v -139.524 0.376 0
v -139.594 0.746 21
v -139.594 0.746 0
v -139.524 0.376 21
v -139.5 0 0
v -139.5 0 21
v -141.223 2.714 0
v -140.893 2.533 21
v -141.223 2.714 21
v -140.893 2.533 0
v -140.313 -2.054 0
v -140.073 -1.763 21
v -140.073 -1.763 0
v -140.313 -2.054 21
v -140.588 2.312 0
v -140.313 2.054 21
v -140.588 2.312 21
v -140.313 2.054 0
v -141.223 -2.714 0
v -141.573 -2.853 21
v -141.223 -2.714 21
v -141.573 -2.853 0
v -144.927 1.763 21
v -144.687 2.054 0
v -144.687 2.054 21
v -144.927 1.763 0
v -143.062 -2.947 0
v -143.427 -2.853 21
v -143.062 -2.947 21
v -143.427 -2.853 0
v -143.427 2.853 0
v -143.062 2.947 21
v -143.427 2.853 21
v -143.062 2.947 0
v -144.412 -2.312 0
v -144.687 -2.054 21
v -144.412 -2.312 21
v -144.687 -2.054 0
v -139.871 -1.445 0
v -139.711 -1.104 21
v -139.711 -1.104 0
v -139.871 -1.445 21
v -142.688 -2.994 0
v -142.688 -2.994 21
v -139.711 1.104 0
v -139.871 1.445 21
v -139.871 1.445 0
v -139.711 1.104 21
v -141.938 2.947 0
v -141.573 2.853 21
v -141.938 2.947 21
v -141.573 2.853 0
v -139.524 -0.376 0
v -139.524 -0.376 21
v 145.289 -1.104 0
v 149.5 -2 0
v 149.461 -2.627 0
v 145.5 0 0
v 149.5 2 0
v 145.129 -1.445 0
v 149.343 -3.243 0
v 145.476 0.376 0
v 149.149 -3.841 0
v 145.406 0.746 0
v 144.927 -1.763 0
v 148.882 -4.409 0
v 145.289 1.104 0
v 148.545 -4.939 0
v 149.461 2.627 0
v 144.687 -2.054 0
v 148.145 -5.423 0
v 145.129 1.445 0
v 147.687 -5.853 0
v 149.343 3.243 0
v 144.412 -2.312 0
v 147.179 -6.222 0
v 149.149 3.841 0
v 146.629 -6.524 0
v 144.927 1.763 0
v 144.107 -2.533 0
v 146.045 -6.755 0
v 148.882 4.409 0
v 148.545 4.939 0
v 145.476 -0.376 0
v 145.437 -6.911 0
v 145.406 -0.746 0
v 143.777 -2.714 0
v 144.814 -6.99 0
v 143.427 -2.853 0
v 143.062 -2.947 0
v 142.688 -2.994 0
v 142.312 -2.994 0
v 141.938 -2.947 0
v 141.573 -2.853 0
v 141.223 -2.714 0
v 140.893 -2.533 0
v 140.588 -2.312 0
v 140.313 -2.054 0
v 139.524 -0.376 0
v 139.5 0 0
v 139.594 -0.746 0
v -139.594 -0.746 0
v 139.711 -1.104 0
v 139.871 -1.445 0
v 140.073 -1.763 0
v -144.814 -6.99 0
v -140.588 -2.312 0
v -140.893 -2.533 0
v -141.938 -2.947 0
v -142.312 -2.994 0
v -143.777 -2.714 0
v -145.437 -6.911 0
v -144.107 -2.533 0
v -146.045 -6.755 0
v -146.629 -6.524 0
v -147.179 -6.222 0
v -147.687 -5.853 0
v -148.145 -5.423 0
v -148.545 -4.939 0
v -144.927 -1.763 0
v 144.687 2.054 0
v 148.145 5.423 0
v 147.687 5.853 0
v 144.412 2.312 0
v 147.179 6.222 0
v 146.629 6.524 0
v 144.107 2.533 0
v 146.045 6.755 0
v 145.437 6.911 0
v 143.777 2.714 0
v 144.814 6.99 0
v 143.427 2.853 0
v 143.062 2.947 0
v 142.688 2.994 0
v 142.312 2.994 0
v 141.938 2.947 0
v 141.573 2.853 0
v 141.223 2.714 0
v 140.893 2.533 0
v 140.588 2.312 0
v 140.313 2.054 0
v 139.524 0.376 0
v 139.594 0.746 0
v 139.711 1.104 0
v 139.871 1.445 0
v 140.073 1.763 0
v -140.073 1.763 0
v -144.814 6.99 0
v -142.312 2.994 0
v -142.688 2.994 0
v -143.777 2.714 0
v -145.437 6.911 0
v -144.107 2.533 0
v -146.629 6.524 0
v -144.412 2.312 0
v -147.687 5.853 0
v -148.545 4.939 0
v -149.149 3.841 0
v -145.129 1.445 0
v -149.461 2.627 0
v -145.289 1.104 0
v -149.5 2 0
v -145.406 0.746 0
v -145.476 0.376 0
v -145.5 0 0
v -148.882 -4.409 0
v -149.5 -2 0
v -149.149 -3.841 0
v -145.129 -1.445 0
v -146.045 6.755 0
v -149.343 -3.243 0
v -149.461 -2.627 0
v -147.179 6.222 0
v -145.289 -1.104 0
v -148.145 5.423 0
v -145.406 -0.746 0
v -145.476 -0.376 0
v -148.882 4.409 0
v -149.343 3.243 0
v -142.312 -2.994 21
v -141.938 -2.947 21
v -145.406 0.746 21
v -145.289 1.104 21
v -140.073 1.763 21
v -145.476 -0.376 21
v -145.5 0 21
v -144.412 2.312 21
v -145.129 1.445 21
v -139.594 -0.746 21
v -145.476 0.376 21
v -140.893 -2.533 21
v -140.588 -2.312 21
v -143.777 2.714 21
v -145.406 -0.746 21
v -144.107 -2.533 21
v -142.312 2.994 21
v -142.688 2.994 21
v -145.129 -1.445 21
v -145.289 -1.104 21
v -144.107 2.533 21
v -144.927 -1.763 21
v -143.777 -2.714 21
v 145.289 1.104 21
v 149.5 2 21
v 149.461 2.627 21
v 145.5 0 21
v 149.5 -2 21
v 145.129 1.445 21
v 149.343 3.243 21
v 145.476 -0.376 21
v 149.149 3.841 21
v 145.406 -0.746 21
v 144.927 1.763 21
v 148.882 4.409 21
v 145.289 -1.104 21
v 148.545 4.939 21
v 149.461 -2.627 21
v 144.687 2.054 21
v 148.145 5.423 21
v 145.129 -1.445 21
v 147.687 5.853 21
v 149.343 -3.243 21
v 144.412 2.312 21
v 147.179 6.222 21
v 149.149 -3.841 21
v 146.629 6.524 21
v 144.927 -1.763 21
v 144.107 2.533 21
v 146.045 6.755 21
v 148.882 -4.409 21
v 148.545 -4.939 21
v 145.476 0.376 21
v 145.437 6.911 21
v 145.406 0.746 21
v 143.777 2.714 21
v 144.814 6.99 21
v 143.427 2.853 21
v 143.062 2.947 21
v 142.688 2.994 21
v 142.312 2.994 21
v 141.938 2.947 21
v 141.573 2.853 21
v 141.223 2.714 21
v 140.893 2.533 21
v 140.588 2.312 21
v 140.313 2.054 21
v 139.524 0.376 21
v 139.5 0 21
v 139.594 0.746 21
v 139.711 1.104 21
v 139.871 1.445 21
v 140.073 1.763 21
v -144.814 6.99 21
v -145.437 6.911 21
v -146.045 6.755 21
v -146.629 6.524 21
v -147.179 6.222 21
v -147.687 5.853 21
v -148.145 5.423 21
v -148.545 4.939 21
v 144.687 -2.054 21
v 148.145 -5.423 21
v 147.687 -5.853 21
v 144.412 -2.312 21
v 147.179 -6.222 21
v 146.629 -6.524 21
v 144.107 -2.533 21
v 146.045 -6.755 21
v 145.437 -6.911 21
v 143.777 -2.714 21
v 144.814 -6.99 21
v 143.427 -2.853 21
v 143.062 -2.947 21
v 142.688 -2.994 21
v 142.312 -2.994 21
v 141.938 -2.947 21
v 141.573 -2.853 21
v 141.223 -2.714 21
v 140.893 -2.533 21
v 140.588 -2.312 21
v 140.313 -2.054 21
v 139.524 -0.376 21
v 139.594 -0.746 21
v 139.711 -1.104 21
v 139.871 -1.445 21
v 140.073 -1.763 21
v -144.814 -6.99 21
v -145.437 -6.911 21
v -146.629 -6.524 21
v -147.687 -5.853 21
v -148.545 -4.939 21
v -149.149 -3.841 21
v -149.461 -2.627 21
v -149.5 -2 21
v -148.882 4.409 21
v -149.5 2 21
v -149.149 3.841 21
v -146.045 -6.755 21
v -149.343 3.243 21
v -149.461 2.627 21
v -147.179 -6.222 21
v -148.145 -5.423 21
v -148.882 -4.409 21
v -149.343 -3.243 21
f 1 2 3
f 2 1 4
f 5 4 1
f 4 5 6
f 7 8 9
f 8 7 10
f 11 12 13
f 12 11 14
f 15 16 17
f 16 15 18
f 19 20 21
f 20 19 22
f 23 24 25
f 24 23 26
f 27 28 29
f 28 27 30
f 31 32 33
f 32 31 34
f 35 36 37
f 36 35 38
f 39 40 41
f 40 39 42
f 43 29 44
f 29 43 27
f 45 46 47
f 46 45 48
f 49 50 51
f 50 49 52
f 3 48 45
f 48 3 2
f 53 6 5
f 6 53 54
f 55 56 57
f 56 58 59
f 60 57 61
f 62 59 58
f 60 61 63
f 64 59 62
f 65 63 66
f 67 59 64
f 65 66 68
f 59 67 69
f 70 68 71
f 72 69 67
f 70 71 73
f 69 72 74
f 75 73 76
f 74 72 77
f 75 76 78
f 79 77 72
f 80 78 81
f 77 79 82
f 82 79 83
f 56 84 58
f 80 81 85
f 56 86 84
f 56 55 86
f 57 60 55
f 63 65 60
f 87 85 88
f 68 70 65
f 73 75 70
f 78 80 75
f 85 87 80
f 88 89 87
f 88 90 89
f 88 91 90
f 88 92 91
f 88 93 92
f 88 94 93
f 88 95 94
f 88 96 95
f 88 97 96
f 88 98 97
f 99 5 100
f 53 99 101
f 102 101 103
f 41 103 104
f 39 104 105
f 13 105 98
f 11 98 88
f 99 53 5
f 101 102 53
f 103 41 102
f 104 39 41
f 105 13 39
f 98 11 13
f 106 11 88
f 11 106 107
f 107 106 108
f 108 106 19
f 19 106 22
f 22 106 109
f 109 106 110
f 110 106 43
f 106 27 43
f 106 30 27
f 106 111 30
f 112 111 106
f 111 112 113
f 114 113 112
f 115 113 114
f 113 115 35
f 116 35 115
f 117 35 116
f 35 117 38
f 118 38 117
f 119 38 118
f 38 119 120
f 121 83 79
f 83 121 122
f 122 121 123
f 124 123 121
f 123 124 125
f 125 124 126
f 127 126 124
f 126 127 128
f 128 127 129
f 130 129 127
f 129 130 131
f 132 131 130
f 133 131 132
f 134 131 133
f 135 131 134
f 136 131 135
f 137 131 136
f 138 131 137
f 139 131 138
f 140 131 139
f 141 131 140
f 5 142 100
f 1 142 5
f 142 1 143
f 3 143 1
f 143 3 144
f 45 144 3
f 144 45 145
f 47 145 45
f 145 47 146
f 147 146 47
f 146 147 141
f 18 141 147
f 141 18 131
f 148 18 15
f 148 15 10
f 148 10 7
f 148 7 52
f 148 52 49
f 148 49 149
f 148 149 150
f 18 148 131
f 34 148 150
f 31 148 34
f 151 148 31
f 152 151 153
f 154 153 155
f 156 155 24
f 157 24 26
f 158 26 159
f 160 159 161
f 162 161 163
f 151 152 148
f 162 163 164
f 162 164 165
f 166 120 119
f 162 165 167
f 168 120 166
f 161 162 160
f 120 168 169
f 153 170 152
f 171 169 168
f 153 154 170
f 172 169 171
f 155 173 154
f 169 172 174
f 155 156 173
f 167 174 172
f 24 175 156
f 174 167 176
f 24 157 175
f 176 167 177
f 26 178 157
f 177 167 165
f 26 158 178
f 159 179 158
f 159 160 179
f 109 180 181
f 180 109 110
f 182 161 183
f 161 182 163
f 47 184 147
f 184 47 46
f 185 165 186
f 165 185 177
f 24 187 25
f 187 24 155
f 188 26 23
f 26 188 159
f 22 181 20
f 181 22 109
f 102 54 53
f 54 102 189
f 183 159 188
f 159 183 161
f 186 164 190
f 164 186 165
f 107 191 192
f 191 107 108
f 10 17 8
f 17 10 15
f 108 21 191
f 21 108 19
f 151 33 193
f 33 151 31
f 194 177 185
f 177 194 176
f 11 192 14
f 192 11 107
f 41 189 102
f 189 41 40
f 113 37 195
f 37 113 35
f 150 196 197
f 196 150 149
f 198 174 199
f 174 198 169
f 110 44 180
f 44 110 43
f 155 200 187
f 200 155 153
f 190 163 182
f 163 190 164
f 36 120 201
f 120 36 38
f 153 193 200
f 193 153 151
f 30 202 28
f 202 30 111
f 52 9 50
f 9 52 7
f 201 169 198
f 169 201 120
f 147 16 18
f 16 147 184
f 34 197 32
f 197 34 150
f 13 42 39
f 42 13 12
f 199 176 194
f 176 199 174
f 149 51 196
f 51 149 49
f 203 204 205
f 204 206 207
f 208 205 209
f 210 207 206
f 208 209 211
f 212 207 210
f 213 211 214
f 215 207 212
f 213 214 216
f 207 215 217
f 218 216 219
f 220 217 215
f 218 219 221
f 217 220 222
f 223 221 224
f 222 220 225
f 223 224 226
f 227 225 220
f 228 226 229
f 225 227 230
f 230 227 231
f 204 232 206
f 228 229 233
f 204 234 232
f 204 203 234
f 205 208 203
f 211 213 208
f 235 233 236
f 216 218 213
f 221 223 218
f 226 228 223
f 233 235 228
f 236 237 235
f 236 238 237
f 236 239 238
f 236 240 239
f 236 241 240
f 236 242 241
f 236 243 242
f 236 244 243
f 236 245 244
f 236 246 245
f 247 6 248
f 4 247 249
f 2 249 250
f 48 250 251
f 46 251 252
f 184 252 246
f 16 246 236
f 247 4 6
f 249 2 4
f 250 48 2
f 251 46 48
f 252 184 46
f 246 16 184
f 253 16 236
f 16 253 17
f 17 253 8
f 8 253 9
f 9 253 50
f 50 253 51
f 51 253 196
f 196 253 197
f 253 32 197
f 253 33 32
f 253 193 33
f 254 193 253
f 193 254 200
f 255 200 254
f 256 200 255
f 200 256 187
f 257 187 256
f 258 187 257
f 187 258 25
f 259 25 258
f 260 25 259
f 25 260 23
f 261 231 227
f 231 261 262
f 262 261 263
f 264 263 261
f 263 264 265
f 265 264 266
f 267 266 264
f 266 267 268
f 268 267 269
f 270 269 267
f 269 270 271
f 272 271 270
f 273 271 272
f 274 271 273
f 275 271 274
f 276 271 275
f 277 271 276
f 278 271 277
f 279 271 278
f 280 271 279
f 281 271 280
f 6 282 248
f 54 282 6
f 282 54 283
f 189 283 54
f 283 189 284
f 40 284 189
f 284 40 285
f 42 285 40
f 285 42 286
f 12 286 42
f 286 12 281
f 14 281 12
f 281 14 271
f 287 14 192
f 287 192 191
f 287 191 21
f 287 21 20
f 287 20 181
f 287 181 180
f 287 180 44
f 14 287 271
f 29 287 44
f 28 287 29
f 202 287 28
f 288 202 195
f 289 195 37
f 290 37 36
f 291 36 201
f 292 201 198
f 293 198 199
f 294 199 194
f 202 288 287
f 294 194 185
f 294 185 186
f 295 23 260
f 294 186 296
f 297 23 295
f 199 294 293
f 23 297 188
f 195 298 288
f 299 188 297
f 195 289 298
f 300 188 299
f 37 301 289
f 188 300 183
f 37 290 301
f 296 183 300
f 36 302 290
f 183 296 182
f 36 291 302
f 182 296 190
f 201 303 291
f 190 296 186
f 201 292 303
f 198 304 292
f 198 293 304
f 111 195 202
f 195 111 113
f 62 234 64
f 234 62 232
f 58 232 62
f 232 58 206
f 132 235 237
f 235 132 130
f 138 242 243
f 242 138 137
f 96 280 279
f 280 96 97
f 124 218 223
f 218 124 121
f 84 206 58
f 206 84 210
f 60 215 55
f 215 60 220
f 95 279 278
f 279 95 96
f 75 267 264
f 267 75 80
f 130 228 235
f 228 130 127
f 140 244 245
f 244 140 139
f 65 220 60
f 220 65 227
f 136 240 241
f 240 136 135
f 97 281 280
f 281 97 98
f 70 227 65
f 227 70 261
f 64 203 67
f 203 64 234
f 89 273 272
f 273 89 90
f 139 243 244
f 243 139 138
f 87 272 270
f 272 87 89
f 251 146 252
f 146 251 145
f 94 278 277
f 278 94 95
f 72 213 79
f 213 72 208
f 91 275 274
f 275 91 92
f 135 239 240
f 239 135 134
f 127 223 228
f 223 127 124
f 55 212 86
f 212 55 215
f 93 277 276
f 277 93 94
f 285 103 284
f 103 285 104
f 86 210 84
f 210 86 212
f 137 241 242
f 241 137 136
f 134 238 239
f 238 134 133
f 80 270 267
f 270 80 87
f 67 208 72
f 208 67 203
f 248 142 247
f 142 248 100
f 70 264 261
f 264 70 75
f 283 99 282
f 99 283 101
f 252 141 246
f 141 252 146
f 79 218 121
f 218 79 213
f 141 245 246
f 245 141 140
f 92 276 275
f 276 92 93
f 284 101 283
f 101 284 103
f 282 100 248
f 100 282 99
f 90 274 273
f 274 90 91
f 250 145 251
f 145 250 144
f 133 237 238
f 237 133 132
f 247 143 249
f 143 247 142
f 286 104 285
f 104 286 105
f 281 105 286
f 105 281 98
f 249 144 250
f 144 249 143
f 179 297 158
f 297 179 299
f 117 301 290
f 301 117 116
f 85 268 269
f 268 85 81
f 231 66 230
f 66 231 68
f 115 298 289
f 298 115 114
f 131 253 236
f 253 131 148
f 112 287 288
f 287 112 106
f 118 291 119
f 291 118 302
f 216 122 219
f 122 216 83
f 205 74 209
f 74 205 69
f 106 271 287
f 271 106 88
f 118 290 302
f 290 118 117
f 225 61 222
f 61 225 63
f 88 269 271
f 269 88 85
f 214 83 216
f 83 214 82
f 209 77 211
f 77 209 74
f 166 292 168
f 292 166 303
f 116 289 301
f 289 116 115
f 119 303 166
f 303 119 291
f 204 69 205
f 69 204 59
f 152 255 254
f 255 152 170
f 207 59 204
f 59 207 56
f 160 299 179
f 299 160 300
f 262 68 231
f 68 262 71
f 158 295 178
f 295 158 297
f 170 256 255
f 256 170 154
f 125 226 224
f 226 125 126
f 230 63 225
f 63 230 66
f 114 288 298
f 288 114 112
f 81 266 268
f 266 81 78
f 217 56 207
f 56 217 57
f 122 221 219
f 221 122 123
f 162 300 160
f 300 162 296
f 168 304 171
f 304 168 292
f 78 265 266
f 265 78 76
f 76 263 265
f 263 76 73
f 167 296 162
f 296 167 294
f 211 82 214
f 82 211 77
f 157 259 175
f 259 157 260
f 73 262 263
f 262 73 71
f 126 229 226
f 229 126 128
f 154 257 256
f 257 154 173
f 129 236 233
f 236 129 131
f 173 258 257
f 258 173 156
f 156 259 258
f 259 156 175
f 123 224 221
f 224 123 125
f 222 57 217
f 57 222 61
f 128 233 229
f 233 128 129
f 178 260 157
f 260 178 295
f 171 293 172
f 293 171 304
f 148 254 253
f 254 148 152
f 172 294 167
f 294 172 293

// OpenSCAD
$fn = 50;


difference() {
	union() {
		hull() {
			translate(v = [-144.5000000000, 2.0000000000, 0]) {
				cylinder(h = 21, r = 5);
			}
			translate(v = [144.5000000000, 2.0000000000, 0]) {
				cylinder(h = 21, r = 5);
			}
			translate(v = [-144.5000000000, -2.0000000000, 0]) {
				cylinder(h = 21, r = 5);
			}
			translate(v = [144.5000000000, -2.0000000000, 0]) {
				cylinder(h = 21, r = 5);
			}
		}
	}
	union() {
		translate(v = [-142.5000000000, 0.0000000000, 0]) {
			cylinder(h = 21, r = 3.0000000000);
		}
		translate(v = [142.5000000000, 0.0000000000, 0]) {
			cylinder(h = 21, r = 3.0000000000);
		}
		translate(v = [-142.5000000000, 0.0000000000, 0]) {
			cylinder(h = 21, r = 1.5000000000);
		}
		translate(v = [142.5000000000, 0.0000000000, 0]) {
			cylinder(h = 21, r = 1.5000000000);
		}
		translate(v = [-142.5000000000, 0.0000000000, 0]) {
			cylinder(h = 21, r = 1.5000000000);
		}
		translate(v = [142.5000000000, 0.0000000000, 0]) {
			cylinder(h = 21, r = 1.5000000000);
		}
		translate(v = [-142.5000000000, 0.0000000000, 0]) {
			cylinder(h = 21, r = 1.5000000000);
		}
		translate(v = [142.5000000000, 0.0000000000, 0]) {
			cylinder(h = 21, r = 1.5000000000);
		}
	}
}
